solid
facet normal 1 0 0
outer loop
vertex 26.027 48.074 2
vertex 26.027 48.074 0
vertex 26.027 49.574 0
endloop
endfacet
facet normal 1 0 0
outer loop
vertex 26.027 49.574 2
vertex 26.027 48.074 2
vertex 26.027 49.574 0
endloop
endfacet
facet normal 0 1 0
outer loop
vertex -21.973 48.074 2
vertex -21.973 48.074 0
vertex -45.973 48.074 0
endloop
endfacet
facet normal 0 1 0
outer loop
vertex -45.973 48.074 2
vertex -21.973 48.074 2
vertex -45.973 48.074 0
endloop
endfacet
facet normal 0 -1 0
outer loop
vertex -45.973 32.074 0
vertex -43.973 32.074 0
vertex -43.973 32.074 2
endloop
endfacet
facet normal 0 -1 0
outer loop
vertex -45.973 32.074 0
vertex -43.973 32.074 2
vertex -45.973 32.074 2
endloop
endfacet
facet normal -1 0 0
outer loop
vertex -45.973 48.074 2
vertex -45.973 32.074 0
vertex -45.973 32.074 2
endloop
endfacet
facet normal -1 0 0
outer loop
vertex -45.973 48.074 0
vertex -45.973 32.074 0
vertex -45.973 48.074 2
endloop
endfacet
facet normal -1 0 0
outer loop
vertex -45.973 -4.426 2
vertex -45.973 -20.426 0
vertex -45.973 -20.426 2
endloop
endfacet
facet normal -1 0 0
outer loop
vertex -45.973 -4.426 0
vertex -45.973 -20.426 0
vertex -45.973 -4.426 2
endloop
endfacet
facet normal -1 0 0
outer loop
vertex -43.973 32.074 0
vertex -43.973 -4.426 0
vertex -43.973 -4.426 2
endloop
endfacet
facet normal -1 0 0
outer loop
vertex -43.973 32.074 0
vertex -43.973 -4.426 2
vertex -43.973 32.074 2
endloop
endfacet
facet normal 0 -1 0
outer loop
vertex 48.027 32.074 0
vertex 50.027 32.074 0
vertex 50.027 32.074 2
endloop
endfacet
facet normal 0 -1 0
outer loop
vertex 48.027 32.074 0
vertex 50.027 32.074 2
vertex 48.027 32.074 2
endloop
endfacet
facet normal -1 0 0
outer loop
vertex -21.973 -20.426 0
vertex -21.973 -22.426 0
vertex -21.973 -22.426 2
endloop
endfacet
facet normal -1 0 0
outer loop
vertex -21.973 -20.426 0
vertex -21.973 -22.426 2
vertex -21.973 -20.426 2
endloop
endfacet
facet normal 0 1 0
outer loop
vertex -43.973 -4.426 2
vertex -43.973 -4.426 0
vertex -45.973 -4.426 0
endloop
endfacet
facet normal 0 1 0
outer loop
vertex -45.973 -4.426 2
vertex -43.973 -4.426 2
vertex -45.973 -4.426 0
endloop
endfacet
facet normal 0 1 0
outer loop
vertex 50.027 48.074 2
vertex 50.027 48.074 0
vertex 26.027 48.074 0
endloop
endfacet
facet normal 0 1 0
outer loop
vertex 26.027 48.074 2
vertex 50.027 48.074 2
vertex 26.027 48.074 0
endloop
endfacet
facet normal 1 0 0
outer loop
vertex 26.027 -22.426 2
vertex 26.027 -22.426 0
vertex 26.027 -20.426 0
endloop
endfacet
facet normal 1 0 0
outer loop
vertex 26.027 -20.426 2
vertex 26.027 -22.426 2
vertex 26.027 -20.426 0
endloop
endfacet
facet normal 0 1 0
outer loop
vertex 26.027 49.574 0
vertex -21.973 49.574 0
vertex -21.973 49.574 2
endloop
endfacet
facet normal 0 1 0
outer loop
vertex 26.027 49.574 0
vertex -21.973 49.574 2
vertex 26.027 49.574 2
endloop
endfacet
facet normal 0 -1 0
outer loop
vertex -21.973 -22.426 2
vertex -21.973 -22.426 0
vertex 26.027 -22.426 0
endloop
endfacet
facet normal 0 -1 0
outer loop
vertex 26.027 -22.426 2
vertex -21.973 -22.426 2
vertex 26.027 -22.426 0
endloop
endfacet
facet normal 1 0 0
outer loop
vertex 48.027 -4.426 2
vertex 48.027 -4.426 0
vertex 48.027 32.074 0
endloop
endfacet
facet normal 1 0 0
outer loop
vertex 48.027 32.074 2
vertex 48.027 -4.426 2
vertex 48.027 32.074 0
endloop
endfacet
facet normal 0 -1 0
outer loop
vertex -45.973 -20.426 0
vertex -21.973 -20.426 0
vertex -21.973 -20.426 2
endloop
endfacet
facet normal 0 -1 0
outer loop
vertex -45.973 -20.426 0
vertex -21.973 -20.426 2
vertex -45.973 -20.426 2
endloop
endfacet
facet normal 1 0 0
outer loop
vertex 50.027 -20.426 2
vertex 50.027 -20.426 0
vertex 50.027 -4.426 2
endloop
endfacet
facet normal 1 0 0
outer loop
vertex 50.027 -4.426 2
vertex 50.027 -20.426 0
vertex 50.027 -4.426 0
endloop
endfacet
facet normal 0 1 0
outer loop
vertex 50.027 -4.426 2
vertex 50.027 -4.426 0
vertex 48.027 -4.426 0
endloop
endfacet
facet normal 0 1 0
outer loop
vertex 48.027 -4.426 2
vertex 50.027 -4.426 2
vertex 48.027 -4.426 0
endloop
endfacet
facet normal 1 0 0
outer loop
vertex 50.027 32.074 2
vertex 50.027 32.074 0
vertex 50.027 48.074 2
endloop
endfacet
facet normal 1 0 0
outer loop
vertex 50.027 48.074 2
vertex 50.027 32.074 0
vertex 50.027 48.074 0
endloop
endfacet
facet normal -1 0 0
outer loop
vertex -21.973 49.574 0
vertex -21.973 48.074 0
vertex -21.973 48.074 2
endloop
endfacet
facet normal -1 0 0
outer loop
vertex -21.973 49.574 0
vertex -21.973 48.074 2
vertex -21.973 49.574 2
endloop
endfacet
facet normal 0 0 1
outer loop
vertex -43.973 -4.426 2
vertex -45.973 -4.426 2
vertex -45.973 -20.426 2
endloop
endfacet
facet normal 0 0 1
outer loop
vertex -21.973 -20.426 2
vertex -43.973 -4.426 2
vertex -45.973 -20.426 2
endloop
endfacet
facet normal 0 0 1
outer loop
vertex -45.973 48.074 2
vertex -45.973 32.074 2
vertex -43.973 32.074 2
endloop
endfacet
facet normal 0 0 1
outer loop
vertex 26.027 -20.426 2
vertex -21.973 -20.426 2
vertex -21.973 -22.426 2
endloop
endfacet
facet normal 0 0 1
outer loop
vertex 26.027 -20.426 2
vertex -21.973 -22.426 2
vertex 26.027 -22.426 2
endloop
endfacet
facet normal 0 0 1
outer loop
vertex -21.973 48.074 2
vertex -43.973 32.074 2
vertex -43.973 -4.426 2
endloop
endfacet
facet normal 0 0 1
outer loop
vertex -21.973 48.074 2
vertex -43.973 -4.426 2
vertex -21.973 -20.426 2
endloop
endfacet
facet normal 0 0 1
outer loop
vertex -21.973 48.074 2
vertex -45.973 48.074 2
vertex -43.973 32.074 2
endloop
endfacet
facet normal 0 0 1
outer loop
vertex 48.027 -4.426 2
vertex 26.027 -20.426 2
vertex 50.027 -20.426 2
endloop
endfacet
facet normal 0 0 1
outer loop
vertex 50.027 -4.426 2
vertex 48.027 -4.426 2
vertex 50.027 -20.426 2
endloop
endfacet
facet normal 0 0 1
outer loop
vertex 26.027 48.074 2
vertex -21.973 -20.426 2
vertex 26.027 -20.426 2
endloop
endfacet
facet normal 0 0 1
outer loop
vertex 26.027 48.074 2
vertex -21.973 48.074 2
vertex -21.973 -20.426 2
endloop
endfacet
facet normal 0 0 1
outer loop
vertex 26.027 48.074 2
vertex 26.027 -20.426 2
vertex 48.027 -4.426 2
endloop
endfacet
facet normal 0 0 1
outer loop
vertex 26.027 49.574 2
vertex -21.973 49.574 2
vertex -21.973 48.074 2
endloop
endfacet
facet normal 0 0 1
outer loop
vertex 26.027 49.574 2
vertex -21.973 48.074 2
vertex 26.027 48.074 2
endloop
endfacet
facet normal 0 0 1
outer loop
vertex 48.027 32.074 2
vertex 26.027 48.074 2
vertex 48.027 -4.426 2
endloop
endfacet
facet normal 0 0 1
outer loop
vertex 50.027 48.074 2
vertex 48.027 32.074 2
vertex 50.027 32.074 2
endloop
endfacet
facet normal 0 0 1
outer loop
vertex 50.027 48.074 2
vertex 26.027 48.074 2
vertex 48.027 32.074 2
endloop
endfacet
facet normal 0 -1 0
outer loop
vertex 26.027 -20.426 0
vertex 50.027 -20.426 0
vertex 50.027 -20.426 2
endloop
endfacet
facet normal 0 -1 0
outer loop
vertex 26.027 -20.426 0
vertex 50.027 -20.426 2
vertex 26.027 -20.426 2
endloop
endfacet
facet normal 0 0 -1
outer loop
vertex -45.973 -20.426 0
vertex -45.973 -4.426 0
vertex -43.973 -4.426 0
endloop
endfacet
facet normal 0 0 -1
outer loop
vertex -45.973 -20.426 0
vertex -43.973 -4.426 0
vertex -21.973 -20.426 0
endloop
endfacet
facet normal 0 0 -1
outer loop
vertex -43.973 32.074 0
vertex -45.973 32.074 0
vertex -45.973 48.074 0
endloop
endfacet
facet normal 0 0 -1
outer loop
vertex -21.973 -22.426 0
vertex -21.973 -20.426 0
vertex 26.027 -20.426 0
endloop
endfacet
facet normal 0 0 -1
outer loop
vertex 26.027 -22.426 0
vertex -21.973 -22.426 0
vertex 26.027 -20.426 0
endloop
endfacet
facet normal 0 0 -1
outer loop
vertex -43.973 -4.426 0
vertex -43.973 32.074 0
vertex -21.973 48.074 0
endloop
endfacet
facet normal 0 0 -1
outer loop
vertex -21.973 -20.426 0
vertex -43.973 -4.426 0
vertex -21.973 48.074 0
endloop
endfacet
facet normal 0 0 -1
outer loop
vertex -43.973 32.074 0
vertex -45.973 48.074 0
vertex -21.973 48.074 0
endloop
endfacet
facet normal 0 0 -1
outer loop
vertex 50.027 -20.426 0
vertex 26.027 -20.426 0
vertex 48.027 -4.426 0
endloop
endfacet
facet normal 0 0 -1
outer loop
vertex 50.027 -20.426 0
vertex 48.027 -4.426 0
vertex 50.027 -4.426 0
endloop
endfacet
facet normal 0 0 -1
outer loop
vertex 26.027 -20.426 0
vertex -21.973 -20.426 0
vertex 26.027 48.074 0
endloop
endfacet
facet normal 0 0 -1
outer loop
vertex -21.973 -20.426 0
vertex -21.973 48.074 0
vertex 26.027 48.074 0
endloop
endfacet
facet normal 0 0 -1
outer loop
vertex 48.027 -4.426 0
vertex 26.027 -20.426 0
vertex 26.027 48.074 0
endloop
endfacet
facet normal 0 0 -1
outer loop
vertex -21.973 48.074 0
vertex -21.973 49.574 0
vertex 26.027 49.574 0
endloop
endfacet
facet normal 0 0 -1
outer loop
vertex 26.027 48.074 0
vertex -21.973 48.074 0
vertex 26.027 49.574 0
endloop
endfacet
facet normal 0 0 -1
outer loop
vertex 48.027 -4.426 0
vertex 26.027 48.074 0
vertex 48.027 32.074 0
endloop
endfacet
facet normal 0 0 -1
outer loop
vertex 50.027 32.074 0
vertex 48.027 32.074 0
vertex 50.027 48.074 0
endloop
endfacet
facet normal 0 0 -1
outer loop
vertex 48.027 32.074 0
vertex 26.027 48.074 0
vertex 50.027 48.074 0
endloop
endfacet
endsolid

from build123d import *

# Parameters (mm, degrees)
SKETCH_1_W          = 96
SKETCH_1_H          = 72
EXTRUDE_1_DEPTH     = 2
SKETCH_2_W          = 24
SKETCH_2_H          = 2
CUT_EXTRUDE_1_DEPTH = 3
SKETCH_3_W          = 2
SKETCH_3_H          = 36.5
CUT_EXTRUDE_2_DEPTH = 3
SKETCH_4_W          = 2
SKETCH_4_H          = 36.5
CUT_EXTRUDE_3_DEPTH = 3


with BuildPart() as part:
    # ｽｹｯﾁ1 → ﾎﾞｽ - 押し出し1 (new body)
    with BuildSketch(Plane.XY):
        with Locations((2.027244426, 13.573770492)):
            Rectangle(SKETCH_1_W, SKETCH_1_H)
    extrude(amount=EXTRUDE_1_DEPTH)

    # ｽｹｯﾁ2 → ｶｯﾄ - 押し出し1 (cut, through all)
    with BuildSketch(Plane(origin=(0, 0, 0), x_dir=(-1, 0, 0), z_dir=(0, 0, -1))):
        with Locations((33.972755574, -21.426229508)):
            Rectangle(SKETCH_2_W, SKETCH_2_H)
        with Locations((-38.027244426, -21.426229508)):
            Rectangle(SKETCH_2_W, SKETCH_2_H)
        with Locations((33.972755574, 49.073770492)):
            Rectangle(SKETCH_2_W, SKETCH_2_H)
        with Locations((-38.027244426, 49.073770492)):
            Rectangle(SKETCH_2_W, SKETCH_2_H)
    extrude(amount=-CUT_EXTRUDE_1_DEPTH, mode=Mode.SUBTRACT)

    # ｽｹｯﾁ3 → ｶｯﾄ - 押し出し2 (cut, through all)
    with BuildSketch(Plane(origin=(0, 0, 0), x_dir=(-1, 0, 0), z_dir=(0, 0, -1))):
        with Locations((44.972755574, 13.823770492)):
            Rectangle(SKETCH_3_W, SKETCH_3_H)
    extrude(amount=-CUT_EXTRUDE_2_DEPTH, mode=Mode.SUBTRACT)

    # ｽｹｯﾁ4 → ｶｯﾄ - 押し出し3 (cut, through all)
    with BuildSketch(Plane(origin=(0, 0, 0), x_dir=(-1, 0, 0), z_dir=(0, 0, -1))):
        with Locations((-49.027244426, 13.823770492)):
            Rectangle(SKETCH_4_W, SKETCH_4_H)
    extrude(amount=-CUT_EXTRUDE_3_DEPTH, mode=Mode.SUBTRACT)


solid = part.part
